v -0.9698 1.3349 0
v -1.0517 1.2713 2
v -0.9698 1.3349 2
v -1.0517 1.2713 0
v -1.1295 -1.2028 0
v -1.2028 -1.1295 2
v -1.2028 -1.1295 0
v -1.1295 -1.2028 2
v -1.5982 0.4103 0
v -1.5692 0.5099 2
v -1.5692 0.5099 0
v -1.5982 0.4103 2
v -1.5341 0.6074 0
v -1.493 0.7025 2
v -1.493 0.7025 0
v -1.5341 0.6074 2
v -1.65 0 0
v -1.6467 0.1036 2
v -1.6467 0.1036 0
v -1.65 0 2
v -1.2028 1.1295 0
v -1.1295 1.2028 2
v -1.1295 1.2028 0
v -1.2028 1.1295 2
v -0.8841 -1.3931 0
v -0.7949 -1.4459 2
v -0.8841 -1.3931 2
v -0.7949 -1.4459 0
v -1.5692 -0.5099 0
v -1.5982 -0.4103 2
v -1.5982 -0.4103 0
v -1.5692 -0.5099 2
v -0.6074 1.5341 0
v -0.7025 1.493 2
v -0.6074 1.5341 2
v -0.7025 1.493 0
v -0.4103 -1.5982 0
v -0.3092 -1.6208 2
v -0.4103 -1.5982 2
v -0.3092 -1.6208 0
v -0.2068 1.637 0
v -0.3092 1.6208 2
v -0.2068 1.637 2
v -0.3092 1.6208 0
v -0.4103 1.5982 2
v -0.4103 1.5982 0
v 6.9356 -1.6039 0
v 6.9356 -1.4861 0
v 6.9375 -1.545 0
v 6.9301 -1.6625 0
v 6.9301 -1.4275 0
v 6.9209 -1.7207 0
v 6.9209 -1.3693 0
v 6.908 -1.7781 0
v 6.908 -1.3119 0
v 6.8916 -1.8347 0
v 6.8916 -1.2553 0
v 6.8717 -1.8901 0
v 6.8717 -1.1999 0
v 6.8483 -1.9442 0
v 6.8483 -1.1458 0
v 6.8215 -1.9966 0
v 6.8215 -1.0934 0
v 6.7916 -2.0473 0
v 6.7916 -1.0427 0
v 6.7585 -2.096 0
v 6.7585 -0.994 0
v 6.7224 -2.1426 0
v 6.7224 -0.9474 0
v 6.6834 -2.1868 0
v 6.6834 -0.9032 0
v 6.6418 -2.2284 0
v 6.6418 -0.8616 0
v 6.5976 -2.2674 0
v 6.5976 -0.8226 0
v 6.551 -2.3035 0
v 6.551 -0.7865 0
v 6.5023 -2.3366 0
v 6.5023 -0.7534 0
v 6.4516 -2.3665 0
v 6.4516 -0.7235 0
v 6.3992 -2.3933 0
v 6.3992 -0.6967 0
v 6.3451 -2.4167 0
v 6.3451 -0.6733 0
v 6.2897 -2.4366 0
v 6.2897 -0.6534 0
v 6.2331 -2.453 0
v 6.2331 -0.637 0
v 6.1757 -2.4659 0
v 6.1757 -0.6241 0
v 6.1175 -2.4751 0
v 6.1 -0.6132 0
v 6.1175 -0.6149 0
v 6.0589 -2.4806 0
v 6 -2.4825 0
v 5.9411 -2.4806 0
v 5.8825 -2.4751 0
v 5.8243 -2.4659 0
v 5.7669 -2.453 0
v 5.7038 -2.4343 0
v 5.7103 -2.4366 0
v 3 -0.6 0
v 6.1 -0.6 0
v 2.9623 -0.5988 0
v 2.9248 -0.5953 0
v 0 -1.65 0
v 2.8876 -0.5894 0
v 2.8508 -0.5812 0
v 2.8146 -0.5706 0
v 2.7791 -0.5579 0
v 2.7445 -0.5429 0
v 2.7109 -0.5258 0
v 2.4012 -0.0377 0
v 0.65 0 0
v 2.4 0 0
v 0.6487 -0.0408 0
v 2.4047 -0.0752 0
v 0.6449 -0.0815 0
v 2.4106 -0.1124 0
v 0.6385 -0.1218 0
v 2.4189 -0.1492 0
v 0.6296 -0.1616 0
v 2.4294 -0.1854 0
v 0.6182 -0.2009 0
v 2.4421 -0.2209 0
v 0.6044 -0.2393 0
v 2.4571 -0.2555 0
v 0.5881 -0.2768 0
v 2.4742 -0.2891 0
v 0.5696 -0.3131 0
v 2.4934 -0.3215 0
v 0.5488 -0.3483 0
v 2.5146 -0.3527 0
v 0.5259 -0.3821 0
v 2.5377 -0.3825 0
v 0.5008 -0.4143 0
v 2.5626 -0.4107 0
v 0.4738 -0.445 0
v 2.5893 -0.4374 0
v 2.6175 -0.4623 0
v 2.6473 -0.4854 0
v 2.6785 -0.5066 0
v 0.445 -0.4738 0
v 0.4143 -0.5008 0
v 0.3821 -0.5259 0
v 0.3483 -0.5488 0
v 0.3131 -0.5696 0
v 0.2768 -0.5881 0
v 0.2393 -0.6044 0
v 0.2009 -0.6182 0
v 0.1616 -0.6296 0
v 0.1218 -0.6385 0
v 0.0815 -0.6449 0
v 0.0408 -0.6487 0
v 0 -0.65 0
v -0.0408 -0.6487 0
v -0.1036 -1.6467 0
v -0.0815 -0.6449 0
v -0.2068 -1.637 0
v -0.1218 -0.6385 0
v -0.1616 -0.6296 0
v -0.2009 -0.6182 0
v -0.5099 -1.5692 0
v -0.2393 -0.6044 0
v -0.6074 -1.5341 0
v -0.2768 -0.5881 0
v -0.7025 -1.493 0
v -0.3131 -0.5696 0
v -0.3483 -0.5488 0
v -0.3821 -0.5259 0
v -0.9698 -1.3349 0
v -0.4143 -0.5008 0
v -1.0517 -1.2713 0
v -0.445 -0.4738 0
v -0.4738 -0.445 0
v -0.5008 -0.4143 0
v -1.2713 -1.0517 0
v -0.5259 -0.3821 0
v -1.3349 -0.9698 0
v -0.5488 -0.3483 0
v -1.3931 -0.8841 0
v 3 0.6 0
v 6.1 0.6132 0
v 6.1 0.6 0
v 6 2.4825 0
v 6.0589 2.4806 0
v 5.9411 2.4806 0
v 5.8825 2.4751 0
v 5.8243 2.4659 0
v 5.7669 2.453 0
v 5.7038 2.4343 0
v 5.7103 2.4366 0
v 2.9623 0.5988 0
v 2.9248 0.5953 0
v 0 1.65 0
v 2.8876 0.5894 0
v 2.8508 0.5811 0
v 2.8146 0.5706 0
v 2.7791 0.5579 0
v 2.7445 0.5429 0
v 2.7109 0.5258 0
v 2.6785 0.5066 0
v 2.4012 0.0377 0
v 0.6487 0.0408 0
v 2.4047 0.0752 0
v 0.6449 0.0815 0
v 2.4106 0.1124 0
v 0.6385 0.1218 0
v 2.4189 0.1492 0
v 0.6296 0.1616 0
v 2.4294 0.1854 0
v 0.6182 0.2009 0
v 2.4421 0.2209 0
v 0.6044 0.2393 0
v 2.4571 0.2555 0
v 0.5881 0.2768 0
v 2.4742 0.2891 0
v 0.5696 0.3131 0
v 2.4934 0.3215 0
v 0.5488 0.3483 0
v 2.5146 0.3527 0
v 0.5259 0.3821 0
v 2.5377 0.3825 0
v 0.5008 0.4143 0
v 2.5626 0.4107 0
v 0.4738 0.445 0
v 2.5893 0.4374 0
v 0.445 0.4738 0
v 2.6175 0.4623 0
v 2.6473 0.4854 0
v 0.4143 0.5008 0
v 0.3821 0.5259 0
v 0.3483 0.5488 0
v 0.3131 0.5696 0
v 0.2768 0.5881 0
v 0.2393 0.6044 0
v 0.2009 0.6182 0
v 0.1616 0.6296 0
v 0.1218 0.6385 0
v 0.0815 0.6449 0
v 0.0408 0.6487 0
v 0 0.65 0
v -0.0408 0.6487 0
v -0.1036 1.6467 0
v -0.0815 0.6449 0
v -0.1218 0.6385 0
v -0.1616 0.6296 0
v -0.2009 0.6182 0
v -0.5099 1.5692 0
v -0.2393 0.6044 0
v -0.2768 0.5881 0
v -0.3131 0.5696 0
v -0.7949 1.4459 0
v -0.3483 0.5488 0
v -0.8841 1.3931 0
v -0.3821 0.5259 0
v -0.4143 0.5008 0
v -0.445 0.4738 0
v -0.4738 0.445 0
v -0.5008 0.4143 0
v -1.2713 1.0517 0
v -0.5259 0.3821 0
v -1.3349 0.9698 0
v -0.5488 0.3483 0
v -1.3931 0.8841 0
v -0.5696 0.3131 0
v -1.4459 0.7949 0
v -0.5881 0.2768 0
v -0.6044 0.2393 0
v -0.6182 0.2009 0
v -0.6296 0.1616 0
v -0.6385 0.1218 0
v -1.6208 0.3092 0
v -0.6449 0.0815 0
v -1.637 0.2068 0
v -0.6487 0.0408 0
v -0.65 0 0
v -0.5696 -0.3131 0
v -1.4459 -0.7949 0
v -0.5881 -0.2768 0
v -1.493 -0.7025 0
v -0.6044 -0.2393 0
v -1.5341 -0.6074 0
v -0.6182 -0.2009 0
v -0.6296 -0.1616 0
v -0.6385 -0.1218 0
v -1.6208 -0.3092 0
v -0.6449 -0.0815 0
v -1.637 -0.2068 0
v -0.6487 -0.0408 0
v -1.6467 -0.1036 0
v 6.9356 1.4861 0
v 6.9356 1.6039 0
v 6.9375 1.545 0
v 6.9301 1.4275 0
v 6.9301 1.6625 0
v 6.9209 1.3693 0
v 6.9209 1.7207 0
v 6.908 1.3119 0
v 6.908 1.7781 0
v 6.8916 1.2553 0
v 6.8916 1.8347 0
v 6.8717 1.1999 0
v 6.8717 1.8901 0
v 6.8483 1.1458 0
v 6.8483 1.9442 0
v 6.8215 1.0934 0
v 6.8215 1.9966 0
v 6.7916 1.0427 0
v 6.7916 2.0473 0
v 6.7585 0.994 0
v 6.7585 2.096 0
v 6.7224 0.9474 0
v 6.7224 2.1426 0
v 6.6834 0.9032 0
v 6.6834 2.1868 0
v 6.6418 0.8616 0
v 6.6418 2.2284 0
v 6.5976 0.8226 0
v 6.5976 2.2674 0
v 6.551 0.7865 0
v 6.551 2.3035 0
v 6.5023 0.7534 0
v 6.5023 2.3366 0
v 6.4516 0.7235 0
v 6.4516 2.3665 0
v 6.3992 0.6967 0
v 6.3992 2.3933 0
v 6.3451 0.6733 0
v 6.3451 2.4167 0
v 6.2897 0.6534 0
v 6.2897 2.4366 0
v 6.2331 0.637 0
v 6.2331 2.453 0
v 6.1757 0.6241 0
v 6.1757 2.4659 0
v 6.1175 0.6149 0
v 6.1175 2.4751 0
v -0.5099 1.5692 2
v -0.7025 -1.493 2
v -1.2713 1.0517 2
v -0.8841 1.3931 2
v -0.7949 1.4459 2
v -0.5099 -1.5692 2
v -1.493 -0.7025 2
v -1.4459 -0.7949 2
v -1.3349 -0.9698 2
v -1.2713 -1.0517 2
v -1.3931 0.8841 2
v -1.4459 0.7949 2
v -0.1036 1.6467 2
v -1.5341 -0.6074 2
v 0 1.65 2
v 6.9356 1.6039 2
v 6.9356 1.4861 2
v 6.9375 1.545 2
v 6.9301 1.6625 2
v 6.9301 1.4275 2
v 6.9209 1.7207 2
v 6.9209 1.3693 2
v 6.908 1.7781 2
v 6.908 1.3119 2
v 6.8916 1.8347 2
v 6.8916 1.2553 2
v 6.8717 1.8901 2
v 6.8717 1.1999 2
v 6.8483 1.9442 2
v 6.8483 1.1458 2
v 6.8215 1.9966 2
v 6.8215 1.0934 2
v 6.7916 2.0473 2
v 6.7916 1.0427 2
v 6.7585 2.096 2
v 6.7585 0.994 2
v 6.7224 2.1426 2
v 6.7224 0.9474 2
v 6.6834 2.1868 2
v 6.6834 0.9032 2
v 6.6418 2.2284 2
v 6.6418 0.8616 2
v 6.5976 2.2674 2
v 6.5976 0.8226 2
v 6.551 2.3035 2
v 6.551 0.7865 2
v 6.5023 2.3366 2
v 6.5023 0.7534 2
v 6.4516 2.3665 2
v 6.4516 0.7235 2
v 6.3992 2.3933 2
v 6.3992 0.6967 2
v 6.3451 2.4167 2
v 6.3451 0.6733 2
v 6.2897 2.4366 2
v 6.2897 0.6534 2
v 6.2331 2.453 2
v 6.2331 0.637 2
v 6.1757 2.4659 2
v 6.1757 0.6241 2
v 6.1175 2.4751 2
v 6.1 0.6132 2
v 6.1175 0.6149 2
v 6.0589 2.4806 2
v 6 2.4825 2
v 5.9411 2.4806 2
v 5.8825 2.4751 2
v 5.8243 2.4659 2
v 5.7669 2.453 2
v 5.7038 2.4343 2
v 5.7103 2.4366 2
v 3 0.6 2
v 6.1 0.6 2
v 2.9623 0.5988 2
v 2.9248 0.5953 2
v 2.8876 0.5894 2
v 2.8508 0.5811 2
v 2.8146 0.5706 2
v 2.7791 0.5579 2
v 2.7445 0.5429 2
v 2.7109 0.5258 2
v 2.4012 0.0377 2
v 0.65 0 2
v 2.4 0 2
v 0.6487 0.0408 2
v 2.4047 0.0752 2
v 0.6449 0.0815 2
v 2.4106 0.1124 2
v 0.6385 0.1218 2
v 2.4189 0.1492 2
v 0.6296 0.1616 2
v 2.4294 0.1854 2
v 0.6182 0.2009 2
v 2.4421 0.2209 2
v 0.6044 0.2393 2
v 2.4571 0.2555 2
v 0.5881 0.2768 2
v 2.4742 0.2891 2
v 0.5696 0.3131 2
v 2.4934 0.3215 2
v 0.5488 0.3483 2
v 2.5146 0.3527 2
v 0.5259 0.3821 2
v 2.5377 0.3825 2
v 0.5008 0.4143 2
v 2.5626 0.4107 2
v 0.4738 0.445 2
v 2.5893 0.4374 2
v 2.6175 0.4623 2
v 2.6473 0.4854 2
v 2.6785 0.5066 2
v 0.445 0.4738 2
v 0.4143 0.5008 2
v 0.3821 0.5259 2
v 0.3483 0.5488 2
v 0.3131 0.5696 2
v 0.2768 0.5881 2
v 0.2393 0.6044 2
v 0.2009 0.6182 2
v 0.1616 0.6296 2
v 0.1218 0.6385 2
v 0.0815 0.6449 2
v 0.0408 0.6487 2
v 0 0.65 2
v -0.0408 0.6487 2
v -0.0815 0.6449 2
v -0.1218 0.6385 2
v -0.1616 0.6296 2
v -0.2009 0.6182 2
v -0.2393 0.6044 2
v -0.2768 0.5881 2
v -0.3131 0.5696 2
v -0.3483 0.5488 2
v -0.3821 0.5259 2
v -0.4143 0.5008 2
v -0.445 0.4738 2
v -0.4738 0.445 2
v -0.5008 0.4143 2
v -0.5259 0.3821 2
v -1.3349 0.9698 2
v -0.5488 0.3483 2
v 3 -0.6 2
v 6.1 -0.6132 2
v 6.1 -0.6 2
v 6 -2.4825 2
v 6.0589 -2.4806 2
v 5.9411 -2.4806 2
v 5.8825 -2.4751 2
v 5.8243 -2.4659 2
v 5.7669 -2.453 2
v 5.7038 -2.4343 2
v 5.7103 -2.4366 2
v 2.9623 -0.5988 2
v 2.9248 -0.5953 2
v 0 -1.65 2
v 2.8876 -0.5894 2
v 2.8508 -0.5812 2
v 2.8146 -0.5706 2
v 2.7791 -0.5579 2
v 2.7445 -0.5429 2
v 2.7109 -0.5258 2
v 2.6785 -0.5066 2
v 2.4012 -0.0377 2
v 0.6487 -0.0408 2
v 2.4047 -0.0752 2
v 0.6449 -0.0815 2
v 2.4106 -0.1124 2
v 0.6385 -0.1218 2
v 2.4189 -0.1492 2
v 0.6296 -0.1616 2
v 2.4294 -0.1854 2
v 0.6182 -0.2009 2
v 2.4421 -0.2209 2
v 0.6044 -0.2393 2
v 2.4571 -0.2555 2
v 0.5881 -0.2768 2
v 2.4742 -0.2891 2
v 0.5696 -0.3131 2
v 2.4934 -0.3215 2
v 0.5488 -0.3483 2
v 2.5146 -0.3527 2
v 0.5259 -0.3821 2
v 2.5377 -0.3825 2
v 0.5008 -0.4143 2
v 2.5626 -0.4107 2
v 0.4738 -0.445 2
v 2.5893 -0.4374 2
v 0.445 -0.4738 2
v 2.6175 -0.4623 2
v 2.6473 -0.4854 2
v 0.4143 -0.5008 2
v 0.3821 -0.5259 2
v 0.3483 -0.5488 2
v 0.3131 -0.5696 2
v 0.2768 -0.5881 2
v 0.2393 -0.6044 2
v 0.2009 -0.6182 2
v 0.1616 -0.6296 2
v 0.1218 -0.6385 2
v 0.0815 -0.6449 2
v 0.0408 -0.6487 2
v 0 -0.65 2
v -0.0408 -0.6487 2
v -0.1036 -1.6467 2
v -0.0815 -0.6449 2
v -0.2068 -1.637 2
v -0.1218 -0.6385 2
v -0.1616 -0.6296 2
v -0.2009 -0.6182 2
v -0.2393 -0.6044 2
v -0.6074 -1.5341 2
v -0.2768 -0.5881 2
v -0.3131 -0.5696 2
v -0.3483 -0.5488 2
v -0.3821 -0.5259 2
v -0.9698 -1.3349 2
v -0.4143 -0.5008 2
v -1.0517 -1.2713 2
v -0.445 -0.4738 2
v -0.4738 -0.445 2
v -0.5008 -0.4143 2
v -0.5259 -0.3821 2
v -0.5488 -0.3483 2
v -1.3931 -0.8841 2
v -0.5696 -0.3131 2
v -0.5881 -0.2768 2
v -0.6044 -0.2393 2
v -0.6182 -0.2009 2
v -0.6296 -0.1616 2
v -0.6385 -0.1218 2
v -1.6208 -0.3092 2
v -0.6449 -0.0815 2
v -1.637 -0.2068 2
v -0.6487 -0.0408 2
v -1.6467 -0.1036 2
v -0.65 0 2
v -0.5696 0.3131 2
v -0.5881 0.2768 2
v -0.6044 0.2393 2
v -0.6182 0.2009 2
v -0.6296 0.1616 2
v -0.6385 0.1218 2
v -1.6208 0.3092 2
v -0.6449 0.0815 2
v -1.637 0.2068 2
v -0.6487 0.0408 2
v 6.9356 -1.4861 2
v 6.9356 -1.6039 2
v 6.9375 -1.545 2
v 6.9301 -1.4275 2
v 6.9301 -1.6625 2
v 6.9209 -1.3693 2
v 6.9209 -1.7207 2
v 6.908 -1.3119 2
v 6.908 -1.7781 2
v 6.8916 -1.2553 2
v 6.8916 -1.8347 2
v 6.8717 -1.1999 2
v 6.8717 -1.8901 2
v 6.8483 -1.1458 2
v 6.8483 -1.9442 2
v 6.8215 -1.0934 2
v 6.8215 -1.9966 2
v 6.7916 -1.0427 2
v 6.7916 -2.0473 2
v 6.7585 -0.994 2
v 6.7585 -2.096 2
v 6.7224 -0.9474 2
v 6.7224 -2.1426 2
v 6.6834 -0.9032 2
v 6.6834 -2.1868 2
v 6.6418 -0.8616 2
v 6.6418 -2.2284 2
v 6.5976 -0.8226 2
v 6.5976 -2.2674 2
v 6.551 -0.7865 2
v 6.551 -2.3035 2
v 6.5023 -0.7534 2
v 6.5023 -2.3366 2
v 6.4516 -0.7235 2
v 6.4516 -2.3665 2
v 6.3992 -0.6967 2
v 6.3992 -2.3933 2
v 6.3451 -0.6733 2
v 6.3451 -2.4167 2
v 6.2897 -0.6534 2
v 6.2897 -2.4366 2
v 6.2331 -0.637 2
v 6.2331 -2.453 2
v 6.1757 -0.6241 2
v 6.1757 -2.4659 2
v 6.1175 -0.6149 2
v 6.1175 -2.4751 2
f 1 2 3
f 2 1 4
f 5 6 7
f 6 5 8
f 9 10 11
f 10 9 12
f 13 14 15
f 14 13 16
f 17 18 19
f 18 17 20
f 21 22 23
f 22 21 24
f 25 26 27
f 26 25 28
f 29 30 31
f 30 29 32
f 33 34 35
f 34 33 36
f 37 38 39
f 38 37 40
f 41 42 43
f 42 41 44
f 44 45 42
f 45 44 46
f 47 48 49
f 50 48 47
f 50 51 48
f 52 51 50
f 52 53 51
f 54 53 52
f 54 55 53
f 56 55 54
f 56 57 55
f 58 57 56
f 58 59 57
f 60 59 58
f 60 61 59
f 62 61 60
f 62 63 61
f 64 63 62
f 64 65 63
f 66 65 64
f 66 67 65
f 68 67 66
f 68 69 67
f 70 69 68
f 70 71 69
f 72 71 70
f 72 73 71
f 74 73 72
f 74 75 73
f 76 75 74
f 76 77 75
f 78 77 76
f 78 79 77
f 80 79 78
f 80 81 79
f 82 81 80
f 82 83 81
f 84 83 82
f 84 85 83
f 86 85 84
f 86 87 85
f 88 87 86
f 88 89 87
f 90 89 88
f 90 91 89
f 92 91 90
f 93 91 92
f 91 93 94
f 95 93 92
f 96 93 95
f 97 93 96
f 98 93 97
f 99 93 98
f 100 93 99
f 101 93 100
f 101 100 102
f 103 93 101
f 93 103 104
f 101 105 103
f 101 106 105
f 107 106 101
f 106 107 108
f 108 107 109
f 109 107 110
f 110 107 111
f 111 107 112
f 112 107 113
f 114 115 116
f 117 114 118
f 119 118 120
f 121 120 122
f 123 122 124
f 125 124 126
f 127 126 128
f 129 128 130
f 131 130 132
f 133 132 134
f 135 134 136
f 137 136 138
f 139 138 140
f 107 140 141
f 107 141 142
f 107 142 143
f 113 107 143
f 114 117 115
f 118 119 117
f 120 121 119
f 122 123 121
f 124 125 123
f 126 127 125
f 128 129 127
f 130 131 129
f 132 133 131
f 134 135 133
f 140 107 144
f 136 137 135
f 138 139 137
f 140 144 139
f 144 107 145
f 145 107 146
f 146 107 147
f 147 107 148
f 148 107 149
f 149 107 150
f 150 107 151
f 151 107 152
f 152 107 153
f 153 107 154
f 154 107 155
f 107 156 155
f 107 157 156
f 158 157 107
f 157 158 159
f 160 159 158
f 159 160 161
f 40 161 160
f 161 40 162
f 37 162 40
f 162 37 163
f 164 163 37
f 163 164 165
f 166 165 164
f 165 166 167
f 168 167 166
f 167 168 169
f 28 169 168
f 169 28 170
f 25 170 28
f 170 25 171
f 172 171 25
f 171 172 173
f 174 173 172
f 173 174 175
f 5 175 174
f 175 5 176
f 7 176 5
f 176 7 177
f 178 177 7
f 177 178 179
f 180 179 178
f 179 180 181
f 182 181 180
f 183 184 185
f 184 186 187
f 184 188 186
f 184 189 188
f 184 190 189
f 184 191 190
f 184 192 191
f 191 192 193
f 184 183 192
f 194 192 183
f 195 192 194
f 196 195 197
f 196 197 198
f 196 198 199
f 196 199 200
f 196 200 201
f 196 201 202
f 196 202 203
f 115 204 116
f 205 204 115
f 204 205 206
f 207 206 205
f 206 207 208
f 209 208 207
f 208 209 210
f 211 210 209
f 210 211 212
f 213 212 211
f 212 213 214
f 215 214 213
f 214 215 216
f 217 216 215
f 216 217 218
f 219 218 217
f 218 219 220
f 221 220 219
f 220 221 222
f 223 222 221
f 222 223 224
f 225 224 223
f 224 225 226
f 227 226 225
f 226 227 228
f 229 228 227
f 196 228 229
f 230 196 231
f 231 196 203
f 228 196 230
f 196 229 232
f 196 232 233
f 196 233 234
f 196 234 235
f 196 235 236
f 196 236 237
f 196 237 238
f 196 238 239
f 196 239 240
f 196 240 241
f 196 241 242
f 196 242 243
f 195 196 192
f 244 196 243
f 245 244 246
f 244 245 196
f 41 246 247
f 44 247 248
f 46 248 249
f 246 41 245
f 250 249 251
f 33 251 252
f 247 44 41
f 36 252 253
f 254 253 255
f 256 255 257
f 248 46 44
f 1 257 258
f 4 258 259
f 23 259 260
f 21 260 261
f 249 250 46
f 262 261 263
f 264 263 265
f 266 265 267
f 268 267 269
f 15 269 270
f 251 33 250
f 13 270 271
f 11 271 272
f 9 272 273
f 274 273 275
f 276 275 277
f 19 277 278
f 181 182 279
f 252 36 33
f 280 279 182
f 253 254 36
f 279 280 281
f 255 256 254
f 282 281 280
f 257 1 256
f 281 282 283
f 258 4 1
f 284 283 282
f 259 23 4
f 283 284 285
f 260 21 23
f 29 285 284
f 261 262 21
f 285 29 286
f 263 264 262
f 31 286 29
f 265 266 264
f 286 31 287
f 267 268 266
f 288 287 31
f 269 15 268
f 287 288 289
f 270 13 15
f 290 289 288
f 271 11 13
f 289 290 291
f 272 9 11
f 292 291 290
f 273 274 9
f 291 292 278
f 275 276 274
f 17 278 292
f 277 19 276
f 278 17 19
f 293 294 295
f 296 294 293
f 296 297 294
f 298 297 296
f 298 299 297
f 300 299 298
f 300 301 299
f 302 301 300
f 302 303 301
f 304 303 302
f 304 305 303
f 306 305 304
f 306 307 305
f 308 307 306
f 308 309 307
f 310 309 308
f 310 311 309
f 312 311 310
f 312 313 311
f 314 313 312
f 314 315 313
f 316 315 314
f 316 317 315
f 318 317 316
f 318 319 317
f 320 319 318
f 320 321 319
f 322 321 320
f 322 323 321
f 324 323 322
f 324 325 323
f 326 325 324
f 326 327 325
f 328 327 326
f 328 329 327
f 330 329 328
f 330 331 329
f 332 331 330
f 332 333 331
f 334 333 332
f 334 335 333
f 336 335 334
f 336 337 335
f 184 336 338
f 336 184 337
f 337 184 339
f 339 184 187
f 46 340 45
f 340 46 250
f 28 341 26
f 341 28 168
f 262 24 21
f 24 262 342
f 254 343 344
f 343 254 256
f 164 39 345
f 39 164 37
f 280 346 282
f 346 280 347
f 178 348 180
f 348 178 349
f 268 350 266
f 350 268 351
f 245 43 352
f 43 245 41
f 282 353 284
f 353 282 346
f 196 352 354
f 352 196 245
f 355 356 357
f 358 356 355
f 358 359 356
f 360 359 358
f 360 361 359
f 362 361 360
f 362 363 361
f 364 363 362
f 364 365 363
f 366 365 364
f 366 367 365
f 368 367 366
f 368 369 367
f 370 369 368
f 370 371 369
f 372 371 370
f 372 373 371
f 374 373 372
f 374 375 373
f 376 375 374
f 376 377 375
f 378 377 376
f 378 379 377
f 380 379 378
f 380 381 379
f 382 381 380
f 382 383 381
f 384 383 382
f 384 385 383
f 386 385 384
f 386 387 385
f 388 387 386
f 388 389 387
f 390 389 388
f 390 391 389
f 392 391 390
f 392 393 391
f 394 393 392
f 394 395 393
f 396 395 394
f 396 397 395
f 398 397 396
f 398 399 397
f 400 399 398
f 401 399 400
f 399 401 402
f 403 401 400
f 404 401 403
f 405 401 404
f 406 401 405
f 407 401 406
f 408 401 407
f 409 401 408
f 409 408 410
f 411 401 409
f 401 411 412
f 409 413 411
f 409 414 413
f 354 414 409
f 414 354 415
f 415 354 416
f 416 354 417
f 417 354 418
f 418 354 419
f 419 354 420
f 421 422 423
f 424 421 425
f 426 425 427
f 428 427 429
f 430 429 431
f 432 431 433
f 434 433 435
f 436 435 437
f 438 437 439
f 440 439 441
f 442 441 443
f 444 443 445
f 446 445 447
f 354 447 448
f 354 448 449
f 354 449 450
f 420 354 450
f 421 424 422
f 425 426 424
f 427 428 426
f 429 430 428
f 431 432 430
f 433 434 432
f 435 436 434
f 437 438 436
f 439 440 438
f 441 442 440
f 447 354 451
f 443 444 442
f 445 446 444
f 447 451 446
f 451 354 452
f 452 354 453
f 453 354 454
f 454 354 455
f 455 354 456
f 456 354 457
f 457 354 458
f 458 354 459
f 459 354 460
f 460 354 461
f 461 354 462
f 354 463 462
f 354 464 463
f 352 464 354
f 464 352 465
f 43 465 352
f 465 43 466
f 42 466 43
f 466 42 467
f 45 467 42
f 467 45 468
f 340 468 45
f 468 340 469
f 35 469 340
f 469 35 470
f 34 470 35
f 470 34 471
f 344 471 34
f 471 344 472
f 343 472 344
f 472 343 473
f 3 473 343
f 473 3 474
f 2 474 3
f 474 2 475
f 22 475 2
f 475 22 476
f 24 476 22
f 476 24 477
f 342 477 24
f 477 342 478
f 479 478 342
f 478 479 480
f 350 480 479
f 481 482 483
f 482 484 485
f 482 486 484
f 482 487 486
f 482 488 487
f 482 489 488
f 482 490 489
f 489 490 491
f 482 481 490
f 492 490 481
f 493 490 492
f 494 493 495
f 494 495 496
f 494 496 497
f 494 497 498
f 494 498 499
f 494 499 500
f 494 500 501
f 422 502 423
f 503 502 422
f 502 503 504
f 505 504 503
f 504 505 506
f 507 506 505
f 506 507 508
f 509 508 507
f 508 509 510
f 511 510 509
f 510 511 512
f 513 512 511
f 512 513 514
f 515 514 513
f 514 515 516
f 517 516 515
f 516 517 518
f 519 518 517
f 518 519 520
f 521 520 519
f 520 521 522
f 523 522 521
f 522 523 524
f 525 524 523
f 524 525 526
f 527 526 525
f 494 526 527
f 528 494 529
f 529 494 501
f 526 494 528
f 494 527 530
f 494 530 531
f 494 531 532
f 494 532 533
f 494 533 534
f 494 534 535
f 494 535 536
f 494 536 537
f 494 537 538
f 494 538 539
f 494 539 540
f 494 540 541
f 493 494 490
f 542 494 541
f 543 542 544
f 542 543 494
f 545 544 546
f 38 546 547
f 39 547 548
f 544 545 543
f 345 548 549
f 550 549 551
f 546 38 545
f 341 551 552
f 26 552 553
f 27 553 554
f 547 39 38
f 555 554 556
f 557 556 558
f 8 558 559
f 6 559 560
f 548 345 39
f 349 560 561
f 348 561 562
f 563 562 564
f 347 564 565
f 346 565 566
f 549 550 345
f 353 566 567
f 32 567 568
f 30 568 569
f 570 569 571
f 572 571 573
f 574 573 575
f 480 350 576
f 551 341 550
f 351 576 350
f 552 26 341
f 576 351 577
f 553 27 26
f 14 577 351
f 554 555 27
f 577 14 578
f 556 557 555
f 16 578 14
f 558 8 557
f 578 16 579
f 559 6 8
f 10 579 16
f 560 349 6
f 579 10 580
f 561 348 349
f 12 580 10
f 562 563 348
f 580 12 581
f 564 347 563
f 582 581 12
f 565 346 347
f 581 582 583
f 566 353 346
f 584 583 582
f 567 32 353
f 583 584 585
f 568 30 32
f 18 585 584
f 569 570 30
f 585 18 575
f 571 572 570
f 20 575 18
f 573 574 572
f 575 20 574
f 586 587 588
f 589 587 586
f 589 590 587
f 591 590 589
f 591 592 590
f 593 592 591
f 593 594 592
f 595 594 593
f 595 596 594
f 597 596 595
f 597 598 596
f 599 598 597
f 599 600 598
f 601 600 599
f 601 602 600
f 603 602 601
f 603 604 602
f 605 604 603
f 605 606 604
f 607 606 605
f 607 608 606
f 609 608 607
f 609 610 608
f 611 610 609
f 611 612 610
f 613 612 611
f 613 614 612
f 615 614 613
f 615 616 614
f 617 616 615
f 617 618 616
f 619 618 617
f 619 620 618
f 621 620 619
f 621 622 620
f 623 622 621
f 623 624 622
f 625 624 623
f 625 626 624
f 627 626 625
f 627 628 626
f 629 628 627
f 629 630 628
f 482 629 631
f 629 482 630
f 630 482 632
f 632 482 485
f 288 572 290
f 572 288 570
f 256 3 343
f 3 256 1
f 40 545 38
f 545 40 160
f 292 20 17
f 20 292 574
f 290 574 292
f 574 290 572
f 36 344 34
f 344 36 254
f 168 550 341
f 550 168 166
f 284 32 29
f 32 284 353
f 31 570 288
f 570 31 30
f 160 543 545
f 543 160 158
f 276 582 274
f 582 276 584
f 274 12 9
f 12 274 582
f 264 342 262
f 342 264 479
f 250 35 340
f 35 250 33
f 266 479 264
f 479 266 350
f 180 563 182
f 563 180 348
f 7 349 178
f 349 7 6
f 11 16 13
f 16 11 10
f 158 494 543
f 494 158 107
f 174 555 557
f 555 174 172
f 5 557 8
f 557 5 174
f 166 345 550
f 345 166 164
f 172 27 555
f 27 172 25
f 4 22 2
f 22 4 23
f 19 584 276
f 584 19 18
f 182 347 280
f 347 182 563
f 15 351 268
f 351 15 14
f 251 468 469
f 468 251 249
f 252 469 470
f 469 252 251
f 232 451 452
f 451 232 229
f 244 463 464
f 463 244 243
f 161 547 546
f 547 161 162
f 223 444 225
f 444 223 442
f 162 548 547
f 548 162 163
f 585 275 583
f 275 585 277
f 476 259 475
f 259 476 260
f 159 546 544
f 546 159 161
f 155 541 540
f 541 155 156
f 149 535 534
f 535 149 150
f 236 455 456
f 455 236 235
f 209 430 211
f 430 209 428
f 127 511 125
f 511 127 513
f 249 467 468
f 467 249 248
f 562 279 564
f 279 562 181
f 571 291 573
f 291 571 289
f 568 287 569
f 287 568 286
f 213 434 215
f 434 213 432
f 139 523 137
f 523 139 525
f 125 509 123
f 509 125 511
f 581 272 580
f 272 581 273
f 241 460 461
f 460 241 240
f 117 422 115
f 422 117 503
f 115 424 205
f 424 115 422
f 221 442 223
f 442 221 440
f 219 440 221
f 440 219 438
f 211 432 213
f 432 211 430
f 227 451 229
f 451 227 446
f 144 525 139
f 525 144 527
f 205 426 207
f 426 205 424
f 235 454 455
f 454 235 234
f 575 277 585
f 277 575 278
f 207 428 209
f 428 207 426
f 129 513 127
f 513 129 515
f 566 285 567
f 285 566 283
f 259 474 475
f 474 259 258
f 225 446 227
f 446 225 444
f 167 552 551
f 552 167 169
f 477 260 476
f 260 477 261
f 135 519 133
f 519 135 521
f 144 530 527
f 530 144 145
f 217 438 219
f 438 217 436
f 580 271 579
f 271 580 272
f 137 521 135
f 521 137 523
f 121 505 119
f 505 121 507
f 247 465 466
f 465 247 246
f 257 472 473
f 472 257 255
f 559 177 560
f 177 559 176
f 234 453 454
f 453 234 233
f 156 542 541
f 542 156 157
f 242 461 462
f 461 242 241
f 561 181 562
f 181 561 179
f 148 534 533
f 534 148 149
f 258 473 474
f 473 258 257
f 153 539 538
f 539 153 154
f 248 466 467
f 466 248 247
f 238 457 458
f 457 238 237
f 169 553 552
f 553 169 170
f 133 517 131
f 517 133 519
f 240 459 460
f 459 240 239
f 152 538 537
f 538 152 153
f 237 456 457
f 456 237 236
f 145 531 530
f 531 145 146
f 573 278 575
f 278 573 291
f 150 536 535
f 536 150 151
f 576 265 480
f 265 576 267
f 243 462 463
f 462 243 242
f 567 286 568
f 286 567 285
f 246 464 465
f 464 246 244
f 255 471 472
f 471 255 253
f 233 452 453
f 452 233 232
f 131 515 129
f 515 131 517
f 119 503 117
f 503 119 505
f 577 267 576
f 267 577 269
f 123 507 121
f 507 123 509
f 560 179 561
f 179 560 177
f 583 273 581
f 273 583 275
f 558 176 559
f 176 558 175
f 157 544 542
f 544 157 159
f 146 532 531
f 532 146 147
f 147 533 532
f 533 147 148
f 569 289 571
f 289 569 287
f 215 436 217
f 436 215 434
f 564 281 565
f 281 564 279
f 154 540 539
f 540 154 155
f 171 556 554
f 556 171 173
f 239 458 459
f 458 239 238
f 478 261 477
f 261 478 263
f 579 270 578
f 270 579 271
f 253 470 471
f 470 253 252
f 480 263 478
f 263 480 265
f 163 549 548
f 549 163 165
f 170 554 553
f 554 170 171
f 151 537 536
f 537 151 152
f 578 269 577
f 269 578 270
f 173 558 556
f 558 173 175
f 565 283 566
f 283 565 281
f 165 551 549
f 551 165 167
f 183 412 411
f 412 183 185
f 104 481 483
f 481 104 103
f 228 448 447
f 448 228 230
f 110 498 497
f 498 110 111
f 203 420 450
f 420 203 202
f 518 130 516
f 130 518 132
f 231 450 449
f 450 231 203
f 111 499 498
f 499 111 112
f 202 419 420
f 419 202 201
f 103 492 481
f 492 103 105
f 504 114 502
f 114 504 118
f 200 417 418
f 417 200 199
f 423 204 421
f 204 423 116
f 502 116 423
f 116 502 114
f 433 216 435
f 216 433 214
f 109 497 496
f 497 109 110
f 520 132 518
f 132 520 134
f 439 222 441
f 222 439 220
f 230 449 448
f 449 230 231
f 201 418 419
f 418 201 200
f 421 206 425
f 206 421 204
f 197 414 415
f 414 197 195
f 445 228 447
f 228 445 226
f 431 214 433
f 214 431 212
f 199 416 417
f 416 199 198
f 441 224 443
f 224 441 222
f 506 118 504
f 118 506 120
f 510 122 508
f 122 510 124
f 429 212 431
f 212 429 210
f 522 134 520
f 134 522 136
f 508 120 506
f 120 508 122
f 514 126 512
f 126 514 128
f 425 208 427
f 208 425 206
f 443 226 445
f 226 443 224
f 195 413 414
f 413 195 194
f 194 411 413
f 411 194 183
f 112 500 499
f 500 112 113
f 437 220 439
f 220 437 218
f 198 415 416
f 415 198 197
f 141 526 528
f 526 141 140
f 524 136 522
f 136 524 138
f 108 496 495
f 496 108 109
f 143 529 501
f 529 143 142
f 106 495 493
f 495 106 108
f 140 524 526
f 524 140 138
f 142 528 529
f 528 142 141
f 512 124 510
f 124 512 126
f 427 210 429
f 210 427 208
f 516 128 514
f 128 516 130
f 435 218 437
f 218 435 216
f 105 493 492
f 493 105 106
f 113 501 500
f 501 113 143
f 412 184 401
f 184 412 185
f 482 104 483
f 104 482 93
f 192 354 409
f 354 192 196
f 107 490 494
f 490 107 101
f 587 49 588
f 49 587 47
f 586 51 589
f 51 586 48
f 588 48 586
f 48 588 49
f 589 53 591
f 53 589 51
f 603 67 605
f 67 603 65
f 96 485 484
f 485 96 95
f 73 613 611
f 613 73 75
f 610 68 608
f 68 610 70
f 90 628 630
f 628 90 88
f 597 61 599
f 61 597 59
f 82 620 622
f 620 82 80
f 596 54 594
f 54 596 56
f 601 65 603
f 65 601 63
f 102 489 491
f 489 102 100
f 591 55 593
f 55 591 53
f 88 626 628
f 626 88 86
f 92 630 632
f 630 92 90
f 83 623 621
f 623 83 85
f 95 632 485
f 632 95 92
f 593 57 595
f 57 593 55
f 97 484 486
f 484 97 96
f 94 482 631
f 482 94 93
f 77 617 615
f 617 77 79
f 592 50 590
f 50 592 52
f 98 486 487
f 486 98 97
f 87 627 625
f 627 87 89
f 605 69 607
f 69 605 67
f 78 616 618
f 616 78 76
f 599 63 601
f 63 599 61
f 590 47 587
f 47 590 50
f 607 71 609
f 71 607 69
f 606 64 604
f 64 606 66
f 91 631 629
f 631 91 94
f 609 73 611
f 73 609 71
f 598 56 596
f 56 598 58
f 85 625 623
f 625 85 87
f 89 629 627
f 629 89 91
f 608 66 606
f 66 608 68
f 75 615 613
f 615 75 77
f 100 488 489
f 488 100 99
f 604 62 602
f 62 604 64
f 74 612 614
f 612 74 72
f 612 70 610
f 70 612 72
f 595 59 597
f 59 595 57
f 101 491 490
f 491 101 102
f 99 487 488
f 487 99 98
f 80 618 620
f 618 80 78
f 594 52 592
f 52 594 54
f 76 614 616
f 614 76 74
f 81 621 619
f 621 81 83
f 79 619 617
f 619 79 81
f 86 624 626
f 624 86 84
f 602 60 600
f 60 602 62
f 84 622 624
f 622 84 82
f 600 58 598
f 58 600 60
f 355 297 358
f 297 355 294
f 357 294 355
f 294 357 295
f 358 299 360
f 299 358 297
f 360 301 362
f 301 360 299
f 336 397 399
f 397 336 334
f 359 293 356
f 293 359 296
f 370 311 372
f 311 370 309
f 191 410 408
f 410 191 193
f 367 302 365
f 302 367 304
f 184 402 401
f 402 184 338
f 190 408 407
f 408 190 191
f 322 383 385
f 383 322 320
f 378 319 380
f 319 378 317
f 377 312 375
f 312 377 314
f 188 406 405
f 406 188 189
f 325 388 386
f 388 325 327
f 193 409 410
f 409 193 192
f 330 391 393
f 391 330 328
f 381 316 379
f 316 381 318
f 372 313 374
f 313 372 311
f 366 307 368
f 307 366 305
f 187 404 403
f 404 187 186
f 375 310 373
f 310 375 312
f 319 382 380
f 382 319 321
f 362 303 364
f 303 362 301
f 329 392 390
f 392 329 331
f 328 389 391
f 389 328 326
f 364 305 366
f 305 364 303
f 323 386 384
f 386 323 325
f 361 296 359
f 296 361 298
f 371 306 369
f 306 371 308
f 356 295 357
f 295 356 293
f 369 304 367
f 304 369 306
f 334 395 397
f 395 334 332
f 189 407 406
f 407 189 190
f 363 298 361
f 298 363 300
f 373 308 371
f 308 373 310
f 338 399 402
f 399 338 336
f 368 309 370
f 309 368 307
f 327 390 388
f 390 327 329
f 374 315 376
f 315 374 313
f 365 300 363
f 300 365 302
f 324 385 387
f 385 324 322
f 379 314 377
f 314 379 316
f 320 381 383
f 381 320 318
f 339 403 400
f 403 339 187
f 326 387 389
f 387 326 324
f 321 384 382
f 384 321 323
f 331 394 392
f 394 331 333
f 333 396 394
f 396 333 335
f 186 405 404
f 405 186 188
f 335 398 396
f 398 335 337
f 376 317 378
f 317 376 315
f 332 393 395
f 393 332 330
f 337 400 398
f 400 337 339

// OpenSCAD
$fn=100;

steelDia = 1.3;
width = 3.3;
innerWidth = 1.2;

depth = 6;
gapDepth = 3;

difference() {
    cylinder(d=width, h=2);
    cylinder(d=steelDia, h=2);
}
difference() {
    union() {
        hull() {
            translate([0,-width/2,0]) {
                cube([0.1,width,2]);
            }
            translate([depth,-(width*1.5)/2,0]) {
                cube([0.1,width*1.5,2]);
            }
        }
    }
    cylinder(d=steelDia, h=2);
    translate([gapDepth,-innerWidth/2,0]) {
        cube([5,innerWidth,2]);
        translate([0,innerWidth/2,0]) {
            cylinder(d=innerWidth, h=2);
        }
    }
}
translate([depth,-(((width*1.5)-innerWidth)/2)+0.33,0]) {
    cylinder(d=((width*1.5)-innerWidth)/2, h=2);
}
translate([depth,(((width*1.5)-innerWidth)/2)-0.33,0]) {
    cylinder(d=((width*1.5)-innerWidth)/2, h=2);
}
